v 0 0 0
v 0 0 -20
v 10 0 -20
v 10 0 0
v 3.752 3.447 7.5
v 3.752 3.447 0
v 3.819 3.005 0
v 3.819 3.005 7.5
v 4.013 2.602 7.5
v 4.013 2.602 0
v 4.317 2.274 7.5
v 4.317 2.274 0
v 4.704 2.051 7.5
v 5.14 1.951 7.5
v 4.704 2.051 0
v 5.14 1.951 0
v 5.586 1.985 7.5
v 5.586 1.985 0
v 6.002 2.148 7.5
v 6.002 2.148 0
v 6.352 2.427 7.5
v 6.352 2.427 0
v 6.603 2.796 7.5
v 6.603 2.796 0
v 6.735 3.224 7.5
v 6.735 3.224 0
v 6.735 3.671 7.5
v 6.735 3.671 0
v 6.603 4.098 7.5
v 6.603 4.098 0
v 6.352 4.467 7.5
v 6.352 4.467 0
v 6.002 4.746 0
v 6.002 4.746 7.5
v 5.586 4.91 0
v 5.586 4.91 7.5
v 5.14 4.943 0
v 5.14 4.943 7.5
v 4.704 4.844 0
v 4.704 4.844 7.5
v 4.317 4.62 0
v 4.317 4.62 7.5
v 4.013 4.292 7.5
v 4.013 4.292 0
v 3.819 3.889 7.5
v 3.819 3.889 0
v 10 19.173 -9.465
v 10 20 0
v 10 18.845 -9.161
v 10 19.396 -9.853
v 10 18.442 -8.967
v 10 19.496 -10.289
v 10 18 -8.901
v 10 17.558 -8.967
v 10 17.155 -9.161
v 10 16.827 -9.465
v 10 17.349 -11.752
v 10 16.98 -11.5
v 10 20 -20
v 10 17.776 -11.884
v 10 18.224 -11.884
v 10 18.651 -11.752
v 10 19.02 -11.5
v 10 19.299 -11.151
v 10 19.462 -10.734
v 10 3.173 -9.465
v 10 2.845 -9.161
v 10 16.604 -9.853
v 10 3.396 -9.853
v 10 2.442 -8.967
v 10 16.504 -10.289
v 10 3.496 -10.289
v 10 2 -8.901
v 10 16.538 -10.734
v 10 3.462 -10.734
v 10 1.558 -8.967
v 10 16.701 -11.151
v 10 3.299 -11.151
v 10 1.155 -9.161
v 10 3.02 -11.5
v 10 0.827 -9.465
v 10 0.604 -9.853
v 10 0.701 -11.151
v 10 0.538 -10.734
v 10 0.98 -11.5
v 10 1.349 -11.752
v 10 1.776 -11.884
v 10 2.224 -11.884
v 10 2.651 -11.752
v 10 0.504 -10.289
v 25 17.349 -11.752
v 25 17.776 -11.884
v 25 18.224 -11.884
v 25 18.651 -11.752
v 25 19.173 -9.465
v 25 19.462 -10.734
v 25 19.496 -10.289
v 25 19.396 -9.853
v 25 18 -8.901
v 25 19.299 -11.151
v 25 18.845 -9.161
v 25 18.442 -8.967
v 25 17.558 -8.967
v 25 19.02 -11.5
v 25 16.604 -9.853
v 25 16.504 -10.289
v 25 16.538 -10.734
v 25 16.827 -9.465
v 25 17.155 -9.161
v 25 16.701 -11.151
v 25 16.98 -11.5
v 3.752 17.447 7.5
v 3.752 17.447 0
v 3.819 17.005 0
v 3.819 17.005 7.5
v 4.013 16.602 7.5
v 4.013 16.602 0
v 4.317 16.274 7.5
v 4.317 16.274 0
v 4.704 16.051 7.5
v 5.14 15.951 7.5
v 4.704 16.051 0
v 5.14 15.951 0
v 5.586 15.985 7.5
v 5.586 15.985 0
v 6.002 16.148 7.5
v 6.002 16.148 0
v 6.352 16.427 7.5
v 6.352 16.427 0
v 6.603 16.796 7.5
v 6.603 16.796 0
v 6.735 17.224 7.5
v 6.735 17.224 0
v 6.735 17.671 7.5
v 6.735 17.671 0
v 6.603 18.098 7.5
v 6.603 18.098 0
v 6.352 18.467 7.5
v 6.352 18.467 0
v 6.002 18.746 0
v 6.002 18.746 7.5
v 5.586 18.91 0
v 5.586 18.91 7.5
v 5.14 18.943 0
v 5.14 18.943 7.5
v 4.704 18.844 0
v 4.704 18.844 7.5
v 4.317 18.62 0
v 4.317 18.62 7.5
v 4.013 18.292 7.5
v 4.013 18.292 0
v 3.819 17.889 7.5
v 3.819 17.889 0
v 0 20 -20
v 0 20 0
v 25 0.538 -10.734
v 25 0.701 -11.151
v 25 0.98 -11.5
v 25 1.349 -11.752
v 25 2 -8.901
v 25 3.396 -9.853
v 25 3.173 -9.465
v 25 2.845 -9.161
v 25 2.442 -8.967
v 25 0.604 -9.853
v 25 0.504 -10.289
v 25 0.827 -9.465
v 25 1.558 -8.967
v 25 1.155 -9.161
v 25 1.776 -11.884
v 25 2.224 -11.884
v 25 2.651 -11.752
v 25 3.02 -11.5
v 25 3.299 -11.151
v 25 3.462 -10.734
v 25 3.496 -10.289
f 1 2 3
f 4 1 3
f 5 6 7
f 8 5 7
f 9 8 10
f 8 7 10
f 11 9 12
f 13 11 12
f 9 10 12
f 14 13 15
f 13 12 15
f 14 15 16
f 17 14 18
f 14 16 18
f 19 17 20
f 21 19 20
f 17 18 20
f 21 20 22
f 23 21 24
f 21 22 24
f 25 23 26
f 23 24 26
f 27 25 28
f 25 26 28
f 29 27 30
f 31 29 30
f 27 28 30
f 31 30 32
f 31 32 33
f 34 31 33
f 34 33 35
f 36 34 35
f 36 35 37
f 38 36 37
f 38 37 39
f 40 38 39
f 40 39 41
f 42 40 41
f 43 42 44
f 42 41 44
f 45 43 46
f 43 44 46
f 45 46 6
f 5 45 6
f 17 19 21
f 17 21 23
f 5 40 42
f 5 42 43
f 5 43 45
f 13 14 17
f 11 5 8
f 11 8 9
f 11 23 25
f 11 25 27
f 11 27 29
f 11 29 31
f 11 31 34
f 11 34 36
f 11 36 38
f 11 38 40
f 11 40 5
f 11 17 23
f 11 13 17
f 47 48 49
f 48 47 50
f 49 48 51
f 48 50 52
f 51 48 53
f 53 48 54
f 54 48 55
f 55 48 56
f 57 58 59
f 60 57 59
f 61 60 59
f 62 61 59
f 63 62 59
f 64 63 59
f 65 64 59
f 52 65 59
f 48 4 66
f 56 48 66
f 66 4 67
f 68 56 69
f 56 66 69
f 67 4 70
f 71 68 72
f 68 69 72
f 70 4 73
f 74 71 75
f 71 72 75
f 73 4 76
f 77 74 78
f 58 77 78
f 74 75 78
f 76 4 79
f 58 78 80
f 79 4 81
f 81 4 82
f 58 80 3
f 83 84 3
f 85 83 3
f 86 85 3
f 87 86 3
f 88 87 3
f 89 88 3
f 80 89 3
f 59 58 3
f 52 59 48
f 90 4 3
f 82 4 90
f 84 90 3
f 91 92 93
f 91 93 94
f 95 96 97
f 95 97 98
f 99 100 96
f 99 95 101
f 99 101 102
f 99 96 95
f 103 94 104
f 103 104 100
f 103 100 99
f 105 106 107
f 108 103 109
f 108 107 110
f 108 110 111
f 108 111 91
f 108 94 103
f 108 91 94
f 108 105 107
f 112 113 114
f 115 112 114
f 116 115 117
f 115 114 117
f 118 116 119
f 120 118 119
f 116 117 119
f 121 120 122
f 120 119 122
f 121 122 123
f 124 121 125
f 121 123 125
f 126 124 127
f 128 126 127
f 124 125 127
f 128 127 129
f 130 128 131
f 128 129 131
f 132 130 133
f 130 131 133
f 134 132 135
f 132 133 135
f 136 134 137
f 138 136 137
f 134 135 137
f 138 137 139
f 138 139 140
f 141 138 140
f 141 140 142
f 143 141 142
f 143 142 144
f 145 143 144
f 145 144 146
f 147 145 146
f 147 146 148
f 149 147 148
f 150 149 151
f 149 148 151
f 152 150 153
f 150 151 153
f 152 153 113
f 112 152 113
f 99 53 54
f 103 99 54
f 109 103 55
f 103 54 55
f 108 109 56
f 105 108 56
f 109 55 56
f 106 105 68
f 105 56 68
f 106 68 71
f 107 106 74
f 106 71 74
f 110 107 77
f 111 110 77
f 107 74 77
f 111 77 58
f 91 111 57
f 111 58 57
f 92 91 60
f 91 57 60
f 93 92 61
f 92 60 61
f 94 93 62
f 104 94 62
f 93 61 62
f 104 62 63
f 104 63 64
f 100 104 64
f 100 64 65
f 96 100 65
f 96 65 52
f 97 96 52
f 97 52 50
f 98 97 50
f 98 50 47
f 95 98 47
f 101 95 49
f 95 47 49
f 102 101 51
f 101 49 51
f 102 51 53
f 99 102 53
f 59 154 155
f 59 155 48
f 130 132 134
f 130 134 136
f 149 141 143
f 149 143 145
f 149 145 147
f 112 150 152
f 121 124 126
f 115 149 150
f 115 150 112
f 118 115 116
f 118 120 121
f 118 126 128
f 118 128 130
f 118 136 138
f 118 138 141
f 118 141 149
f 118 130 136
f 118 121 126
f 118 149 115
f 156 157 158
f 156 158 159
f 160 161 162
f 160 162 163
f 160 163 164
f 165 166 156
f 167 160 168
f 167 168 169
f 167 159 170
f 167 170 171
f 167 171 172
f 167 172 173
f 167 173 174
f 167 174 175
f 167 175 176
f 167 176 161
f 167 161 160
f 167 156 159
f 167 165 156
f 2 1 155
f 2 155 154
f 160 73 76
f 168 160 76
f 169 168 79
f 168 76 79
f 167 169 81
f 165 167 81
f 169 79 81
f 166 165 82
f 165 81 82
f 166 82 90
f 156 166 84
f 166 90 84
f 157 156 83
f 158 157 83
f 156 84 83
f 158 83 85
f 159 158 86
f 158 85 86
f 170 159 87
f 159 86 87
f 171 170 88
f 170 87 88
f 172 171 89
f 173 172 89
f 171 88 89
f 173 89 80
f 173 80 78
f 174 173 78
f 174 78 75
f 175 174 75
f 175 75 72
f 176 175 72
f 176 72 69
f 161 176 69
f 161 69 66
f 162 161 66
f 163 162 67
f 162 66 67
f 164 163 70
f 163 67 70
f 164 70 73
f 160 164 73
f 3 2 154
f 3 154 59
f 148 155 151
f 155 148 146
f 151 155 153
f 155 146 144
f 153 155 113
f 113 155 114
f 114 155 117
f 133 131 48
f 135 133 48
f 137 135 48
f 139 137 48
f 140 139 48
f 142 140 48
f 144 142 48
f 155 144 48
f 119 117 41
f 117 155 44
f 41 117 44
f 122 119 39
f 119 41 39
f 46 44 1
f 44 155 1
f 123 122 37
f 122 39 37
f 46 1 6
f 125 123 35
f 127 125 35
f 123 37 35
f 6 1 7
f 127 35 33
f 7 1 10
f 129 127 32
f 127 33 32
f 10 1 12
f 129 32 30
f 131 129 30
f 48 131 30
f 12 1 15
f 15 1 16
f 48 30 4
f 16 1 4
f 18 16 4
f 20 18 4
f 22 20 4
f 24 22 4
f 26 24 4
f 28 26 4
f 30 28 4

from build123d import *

# Parameters (mm, degrees)
SKETCH2_W           = 10
SKETCH2_H           = 20
BOSS_EXTRUDE1_DEPTH = 20
SKETCH3_R           = 1.5
BOSS_EXTRUDE2_DEPTH = 7.5
SKETCH6_R           = 1.5
BOSS_EXTRUDE4_DEPTH = 15
SKETCH8_R           = 1.5
BOSS_EXTRUDE5_DEPTH = 15


with BuildPart() as part:
    # Sketch2 → Boss-Extrude1 (new body)
    with BuildSketch(Plane(origin=(0, 0, 0), x_dir=(1, 0, 0), z_dir=(0, 1, 0))):
        with Locations((5, 10)):
            Rectangle(SKETCH2_W, SKETCH2_H)
    extrude(amount=BOSS_EXTRUDE1_DEPTH)

    # Sketch3 → Boss-Extrude2 (add)
    with BuildSketch(Plane.XY):
        with Locations(Location((5.252029318, 3.447237738, 0), (0, 0, 180))):
            Circle(SKETCH3_R)
        with Locations(Location((5.252029318, 17.447237738, 0), (0, 0, 180))):
            Circle(SKETCH3_R)
    extrude(amount=BOSS_EXTRUDE2_DEPTH)

    # Sketch6 → Boss-Extrude4 (add)
    with BuildSketch(Plane(origin=(10, 0, 0), x_dir=(0, 0, -1), z_dir=(1, 0, 0))):
        with Locations(Location((10.400607827, 2, 0), (0, 0, 180))):
            Circle(SKETCH6_R)
    extrude(amount=BOSS_EXTRUDE4_DEPTH)

    # Sketch8 → Boss-Extrude5 (add)
    with BuildSketch(Plane(origin=(10, 0, 0), x_dir=(0, 0, -1), z_dir=(1, 0, 0))):
        with Locations(Location((10.400607827, 18, 0), (0, 0, 180))):
            Circle(SKETCH8_R)
    extrude(amount=BOSS_EXTRUDE5_DEPTH)


solid = part.part
